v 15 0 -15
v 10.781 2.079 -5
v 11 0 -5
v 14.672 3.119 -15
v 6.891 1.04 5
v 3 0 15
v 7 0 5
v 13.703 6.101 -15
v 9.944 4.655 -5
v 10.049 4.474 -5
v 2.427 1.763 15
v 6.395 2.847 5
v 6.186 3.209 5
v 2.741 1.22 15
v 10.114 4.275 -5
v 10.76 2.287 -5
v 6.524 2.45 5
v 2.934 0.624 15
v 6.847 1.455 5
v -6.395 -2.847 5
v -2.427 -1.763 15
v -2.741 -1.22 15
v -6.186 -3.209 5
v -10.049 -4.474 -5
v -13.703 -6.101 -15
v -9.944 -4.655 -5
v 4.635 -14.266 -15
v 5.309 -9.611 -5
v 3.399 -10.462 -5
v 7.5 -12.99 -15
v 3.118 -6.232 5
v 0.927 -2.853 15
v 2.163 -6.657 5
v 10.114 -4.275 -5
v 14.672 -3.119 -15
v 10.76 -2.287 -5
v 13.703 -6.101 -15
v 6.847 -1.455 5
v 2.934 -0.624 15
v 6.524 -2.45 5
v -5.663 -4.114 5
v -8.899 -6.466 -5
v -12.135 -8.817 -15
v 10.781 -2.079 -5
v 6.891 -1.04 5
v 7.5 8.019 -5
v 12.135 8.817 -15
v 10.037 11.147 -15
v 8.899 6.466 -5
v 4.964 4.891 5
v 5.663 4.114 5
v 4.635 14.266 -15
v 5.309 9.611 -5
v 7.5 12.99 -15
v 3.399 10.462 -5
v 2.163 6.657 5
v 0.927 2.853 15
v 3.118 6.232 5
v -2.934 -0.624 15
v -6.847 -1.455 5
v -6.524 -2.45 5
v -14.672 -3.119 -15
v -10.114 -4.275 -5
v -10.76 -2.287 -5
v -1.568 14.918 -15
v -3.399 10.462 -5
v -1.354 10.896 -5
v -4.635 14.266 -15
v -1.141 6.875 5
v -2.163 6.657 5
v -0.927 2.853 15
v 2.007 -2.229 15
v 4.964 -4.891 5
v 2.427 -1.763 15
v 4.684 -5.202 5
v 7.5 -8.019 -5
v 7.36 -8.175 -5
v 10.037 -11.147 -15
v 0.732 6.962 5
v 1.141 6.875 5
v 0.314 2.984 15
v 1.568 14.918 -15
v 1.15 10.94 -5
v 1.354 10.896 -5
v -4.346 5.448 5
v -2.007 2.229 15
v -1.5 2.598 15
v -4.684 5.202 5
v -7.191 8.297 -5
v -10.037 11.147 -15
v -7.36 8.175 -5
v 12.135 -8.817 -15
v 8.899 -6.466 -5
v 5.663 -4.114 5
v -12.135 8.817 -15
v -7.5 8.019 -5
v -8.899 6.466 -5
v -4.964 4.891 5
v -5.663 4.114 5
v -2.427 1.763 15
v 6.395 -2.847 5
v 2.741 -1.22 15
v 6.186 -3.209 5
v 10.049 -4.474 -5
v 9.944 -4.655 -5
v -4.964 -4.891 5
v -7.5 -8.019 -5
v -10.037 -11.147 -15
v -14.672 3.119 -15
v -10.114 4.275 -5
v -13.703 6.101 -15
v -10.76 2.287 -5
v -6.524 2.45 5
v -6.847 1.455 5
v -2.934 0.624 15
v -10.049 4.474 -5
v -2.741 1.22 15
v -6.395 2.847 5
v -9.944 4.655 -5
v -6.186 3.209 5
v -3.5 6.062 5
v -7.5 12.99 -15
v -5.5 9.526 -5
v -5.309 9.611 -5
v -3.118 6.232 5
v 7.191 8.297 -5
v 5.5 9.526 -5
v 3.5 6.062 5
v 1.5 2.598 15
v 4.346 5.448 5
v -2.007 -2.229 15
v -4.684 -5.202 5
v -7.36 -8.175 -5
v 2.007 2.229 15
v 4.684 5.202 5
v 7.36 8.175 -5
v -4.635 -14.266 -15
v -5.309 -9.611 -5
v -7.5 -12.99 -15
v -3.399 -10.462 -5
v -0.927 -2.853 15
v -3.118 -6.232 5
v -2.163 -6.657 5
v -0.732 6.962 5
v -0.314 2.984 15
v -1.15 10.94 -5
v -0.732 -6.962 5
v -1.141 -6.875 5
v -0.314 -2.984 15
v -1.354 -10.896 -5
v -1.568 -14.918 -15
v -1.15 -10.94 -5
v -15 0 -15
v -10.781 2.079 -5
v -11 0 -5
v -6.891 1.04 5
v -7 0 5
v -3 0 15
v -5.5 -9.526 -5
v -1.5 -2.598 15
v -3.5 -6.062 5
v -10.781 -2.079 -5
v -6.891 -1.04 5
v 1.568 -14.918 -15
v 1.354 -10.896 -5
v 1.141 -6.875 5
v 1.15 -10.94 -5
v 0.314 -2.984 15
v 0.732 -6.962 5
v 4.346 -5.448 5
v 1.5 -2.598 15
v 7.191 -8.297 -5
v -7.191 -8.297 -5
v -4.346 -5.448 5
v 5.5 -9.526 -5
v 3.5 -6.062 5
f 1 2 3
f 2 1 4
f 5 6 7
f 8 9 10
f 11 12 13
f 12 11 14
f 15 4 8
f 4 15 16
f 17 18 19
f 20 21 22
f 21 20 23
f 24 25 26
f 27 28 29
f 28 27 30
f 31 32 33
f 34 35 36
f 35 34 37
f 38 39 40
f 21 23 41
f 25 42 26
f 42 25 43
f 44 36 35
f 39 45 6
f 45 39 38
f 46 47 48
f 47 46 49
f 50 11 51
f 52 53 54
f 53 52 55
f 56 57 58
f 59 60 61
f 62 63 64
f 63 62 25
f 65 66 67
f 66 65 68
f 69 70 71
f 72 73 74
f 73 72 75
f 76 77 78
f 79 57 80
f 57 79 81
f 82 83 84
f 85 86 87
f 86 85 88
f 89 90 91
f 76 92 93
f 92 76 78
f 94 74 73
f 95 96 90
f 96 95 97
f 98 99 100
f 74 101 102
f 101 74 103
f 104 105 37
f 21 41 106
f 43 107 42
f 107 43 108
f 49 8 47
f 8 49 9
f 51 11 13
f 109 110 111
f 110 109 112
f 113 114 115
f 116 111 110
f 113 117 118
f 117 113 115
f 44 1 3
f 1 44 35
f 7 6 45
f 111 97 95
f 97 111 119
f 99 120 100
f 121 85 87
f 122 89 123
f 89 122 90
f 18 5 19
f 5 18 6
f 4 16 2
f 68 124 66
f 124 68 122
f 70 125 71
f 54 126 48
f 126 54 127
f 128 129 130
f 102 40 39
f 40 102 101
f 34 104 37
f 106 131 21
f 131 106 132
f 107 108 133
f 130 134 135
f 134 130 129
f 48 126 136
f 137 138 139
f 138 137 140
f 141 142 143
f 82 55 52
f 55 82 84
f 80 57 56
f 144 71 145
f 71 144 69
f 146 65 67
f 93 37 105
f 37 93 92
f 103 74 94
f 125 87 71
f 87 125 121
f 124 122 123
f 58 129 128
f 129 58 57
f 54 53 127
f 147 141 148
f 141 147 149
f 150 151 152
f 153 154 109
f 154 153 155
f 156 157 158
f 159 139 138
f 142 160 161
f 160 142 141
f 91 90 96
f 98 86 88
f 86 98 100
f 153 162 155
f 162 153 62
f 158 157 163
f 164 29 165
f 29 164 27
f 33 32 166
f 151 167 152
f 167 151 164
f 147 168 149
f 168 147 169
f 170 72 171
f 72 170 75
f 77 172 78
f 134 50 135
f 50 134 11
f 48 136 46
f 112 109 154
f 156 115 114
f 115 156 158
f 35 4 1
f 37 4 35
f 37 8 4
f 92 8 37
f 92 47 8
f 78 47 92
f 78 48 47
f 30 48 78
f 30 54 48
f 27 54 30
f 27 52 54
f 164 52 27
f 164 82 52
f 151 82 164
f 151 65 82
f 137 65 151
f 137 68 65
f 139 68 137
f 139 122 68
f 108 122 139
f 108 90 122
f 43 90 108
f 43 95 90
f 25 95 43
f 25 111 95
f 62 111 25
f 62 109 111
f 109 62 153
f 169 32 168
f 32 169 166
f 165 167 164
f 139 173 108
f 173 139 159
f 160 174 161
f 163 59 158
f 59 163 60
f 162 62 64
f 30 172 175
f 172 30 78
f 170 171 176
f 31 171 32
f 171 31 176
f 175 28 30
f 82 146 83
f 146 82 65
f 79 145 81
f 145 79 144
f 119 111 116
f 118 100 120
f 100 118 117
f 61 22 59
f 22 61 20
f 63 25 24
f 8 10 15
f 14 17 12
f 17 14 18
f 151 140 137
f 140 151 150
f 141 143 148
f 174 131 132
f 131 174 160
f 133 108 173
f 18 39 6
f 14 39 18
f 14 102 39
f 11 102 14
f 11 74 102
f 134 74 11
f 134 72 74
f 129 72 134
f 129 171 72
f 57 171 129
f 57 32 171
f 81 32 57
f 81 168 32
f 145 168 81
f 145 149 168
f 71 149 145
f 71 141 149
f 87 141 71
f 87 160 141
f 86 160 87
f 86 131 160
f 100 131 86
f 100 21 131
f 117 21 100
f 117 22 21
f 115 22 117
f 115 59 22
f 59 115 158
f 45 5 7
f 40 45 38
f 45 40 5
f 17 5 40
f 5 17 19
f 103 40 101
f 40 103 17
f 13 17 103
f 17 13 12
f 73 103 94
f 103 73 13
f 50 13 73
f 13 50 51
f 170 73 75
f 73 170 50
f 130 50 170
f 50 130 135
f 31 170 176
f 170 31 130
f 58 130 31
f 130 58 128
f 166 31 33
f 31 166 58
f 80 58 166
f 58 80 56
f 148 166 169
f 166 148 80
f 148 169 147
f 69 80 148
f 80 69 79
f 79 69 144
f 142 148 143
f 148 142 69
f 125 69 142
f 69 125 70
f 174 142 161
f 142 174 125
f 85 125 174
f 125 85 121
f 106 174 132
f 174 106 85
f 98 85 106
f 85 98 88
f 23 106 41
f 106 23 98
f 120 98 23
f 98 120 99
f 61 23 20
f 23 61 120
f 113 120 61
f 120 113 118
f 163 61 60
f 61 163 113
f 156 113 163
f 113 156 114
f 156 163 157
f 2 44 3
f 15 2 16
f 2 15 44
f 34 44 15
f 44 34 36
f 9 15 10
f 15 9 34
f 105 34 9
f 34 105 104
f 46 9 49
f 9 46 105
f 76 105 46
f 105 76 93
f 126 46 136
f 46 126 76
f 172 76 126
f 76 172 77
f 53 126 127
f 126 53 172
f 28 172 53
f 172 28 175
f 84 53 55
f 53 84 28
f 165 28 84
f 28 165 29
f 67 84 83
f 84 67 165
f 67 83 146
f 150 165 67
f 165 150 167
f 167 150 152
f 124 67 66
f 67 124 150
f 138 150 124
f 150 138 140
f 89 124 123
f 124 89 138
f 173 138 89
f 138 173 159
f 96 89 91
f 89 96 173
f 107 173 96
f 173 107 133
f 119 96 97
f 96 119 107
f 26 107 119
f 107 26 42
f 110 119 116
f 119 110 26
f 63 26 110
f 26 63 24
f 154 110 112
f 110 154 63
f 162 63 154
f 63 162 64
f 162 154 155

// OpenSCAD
color ("red") 
    difference() {
       cylinder(h=30, r1=15,r2=3,center=true);
       cylinder(h=10, r=15,center=true);
}
